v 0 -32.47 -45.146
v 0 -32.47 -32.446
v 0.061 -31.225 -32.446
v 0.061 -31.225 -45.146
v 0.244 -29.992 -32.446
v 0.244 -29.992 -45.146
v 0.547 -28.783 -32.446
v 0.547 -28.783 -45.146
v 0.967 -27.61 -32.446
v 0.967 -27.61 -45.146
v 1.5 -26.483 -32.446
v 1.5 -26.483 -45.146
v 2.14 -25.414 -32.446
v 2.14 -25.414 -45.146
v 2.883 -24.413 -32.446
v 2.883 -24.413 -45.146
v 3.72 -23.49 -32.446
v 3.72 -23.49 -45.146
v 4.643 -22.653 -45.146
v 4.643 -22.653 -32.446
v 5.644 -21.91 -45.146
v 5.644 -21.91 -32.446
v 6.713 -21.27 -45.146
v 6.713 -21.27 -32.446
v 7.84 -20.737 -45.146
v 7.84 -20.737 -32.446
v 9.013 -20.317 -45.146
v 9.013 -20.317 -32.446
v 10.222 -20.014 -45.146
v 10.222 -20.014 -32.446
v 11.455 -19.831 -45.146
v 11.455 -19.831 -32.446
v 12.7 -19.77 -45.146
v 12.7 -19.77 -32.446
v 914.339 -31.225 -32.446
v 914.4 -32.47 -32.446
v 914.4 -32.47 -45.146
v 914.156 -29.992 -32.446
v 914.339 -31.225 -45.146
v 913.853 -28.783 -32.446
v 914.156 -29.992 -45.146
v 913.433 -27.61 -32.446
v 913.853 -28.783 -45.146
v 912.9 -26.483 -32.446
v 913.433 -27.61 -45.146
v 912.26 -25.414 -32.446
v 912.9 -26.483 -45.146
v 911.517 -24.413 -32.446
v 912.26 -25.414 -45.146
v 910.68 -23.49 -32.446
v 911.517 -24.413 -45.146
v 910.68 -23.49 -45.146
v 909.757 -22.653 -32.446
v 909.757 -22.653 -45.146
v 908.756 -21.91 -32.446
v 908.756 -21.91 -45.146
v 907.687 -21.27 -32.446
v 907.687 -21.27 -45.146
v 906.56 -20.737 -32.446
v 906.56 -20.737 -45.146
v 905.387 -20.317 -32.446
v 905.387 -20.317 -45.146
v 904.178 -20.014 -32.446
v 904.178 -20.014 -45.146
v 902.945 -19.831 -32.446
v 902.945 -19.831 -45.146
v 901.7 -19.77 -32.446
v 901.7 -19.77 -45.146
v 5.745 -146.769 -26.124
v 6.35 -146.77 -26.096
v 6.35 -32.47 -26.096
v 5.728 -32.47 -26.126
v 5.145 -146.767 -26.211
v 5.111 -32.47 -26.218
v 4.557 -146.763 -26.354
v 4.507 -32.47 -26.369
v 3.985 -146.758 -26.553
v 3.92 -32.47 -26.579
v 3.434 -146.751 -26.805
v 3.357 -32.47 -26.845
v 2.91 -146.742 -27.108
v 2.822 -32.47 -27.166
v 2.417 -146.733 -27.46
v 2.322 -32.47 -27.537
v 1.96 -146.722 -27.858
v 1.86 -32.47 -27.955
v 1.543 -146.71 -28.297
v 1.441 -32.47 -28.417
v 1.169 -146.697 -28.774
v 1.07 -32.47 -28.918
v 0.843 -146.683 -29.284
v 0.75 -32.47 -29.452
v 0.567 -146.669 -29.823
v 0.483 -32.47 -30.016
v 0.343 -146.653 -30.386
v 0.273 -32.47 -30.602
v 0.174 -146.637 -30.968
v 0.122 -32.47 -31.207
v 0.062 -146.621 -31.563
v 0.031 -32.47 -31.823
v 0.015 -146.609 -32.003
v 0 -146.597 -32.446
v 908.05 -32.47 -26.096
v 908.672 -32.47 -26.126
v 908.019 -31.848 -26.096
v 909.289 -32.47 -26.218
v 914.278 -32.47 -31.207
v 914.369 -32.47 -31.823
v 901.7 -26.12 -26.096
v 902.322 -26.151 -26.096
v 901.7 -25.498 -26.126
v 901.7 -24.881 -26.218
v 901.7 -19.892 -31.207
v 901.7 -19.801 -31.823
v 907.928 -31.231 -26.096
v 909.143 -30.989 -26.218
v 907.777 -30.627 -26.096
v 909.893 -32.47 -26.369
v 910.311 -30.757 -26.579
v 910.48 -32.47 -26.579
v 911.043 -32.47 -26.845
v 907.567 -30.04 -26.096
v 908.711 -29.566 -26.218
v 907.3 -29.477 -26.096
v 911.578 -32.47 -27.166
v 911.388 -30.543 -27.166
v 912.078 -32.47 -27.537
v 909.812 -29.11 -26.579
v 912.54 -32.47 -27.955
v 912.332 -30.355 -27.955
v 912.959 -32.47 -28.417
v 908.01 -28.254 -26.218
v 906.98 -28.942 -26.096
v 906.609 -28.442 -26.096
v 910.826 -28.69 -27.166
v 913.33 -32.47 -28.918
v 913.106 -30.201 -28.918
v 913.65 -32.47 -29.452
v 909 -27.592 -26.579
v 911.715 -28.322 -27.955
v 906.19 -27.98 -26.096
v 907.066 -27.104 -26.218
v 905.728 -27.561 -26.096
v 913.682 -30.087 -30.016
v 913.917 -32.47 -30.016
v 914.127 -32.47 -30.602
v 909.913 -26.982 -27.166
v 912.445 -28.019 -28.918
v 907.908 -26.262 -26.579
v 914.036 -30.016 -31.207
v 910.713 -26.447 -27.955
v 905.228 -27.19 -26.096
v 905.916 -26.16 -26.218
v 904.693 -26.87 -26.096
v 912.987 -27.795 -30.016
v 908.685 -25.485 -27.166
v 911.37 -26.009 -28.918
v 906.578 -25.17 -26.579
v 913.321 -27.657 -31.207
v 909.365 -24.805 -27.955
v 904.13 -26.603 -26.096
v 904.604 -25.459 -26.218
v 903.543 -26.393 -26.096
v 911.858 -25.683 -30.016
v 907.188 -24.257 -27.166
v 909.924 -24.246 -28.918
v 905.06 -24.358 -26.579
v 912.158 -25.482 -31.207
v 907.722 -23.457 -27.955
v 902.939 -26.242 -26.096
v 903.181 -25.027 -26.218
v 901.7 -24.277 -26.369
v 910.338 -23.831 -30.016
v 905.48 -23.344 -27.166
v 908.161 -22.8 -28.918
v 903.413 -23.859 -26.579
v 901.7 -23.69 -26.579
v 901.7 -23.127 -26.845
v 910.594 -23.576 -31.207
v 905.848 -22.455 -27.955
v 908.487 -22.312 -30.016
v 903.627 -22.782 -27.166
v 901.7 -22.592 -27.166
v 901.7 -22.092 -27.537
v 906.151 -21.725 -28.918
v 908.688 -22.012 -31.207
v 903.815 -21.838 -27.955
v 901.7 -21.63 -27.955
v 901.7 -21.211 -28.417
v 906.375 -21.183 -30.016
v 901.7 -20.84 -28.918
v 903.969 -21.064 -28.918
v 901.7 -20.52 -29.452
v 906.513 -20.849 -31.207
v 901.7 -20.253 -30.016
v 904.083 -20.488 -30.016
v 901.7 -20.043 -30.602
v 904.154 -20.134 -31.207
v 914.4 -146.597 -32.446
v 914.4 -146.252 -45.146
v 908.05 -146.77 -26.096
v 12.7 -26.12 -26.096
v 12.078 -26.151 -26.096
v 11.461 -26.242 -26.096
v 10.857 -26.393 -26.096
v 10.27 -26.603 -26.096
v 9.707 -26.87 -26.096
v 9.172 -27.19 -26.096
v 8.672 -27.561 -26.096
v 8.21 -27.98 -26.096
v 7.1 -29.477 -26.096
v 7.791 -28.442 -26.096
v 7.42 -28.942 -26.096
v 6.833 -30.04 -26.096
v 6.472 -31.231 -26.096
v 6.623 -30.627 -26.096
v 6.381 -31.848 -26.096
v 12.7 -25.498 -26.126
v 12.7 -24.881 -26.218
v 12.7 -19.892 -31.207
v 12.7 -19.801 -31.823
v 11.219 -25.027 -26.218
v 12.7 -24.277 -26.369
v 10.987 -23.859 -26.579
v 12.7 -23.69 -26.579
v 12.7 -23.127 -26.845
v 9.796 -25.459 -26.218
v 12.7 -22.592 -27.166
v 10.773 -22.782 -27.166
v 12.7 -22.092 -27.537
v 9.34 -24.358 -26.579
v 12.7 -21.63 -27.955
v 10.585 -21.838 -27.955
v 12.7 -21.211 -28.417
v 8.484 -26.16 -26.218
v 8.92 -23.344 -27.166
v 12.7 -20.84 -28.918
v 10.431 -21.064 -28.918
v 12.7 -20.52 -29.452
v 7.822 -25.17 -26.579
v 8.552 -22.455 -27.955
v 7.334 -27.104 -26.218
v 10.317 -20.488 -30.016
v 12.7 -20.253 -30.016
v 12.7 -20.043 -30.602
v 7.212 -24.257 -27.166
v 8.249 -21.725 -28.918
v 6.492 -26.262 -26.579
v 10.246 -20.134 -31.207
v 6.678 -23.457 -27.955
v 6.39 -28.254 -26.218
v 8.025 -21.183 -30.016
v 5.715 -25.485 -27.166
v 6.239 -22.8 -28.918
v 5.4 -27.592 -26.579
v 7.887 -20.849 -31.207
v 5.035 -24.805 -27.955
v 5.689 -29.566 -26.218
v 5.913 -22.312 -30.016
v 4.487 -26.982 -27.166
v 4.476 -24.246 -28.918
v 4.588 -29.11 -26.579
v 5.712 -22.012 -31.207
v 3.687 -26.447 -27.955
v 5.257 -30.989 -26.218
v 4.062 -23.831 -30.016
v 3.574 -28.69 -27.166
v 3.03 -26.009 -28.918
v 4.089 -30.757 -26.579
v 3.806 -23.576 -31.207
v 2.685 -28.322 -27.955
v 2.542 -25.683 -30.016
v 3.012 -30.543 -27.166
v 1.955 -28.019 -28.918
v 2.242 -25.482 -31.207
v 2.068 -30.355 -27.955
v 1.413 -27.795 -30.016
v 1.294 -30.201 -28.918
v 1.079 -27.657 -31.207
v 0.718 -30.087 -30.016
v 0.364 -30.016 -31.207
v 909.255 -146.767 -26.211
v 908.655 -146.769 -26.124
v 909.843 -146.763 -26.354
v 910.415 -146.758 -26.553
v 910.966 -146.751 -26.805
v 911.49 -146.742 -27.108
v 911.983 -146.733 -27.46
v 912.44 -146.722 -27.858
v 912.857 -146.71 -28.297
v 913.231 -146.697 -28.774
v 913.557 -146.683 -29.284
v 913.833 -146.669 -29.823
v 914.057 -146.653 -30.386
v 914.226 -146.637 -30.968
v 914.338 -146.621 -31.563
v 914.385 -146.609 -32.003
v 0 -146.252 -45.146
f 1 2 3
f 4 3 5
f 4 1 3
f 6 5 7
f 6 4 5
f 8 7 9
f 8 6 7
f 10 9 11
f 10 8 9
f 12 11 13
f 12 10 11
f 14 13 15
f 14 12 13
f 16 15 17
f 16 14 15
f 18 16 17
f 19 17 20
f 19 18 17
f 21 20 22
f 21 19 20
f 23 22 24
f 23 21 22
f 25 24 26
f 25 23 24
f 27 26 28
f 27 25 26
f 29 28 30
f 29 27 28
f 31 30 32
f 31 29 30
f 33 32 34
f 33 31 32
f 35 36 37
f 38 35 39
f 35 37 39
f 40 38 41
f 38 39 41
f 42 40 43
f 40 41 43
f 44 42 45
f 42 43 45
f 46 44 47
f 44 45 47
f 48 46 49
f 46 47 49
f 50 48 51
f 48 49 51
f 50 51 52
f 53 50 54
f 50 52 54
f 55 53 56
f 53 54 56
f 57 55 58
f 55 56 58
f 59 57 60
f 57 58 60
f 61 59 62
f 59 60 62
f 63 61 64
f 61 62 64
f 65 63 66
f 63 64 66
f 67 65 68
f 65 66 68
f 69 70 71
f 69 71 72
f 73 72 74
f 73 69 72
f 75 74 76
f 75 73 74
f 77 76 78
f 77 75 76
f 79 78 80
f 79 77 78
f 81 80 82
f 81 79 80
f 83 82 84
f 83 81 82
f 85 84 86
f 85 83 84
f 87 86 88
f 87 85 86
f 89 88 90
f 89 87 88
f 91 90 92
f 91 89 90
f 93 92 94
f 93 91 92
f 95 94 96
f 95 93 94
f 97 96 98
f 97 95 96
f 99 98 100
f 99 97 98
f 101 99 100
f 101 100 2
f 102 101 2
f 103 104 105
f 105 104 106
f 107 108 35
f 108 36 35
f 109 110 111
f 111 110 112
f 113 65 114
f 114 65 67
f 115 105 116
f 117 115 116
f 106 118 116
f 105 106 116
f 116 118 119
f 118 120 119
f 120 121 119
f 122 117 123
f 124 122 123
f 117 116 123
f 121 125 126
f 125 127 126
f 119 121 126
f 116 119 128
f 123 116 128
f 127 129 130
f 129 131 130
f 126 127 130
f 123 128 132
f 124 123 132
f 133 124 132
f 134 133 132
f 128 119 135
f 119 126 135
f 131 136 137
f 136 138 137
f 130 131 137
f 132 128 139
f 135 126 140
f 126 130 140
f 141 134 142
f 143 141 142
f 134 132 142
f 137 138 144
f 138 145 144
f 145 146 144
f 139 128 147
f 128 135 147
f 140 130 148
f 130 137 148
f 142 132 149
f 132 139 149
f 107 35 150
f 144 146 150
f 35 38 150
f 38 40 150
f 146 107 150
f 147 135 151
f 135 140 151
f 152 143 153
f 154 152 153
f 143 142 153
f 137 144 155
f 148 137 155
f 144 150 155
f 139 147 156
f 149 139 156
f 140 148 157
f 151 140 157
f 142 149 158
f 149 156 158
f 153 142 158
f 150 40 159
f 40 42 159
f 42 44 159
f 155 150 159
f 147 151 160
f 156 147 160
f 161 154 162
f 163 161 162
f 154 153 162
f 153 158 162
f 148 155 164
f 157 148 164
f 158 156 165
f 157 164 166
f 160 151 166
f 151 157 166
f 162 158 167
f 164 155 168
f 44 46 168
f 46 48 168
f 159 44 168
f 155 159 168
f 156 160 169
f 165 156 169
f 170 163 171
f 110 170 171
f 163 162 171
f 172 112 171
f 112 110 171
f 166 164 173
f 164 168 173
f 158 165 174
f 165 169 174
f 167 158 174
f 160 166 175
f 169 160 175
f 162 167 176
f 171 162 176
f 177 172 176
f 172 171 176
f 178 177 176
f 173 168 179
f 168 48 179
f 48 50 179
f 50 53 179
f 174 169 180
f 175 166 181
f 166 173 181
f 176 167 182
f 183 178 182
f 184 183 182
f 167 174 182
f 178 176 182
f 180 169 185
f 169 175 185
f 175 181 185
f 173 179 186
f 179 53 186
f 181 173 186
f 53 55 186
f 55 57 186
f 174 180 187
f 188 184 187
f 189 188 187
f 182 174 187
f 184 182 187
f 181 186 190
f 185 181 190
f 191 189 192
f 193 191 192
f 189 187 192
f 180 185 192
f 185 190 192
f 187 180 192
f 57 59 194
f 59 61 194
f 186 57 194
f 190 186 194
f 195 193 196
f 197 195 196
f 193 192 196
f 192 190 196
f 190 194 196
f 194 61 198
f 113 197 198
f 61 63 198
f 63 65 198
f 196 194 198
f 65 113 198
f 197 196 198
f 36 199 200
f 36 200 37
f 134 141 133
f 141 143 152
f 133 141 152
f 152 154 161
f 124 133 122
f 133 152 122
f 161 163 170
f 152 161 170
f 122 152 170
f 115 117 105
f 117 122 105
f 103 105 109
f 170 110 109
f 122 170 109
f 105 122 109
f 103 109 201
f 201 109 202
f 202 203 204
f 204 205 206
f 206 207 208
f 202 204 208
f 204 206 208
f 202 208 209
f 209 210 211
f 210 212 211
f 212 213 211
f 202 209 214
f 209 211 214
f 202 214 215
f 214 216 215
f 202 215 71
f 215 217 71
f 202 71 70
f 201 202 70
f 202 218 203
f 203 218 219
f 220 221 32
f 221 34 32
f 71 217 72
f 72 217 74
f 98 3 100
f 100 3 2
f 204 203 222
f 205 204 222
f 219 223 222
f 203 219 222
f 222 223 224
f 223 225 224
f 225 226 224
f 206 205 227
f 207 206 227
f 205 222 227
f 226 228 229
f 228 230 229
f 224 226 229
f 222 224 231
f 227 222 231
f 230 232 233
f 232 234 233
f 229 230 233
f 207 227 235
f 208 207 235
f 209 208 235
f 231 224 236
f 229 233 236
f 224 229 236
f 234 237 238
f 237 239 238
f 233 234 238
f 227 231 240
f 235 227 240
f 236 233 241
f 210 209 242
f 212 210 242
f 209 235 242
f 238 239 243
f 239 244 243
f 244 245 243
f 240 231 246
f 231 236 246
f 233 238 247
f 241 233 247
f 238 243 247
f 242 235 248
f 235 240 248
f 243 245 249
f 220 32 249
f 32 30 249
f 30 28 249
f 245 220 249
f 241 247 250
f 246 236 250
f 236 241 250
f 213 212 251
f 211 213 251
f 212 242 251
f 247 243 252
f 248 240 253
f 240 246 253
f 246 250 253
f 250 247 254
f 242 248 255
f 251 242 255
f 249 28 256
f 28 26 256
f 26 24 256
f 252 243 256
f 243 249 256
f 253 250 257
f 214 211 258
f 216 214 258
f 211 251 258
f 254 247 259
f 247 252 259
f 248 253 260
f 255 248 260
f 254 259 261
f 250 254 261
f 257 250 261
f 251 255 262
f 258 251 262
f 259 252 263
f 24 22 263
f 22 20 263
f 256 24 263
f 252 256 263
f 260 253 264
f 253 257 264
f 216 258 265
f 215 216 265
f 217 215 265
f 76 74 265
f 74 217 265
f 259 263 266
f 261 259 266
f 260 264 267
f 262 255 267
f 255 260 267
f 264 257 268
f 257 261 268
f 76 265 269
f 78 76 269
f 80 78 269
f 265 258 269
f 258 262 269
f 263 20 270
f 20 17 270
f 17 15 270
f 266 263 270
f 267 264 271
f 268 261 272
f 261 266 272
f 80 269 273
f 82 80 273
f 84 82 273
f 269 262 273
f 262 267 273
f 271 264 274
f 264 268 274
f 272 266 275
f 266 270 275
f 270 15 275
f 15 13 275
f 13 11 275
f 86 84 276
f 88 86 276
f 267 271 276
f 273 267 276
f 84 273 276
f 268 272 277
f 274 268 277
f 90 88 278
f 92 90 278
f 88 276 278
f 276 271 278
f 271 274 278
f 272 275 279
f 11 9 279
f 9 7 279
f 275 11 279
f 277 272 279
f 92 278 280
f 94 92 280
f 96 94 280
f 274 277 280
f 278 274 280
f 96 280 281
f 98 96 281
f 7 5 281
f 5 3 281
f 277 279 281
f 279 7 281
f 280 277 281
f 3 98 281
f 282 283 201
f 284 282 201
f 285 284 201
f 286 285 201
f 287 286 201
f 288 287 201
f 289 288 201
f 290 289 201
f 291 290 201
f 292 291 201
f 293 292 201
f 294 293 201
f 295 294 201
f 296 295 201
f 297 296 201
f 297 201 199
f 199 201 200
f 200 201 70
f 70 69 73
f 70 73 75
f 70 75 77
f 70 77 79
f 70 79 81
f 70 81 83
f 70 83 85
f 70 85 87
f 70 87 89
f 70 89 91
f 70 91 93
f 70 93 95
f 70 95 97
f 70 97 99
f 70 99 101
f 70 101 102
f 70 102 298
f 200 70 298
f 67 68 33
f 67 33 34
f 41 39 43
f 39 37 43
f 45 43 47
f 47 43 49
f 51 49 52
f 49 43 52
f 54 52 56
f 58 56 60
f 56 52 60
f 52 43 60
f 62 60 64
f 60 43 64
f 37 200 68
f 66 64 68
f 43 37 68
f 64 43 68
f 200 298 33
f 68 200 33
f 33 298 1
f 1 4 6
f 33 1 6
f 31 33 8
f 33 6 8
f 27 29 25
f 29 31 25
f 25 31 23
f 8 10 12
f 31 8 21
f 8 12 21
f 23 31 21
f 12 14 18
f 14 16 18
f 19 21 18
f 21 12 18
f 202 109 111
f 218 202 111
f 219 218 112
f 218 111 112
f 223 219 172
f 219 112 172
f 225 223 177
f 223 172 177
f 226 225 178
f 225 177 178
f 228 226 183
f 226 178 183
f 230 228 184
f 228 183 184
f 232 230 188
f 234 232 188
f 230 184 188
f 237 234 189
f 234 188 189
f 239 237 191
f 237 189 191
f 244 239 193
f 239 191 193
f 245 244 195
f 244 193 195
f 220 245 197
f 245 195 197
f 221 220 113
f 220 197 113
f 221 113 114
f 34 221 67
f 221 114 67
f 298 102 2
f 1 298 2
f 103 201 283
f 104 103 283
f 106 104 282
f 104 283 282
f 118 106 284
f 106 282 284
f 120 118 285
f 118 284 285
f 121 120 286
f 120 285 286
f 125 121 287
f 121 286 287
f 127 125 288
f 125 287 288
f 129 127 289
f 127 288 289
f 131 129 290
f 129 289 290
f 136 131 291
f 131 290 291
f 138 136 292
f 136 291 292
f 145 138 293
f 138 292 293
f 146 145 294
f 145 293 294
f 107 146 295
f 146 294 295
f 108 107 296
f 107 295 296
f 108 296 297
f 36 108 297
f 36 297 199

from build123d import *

# Parameters (mm, degrees)
F1_DEPTH    = 914.4
F2_R        = 6.35
F3_T1_DEPTH = 50.8
F3_T4_ANGLE = 90
F3_T6_ANGLE = 90


# Not quite as in the source:
# - a fillet or chamfer that OpenCascade refuses, or shapes differently, is made with other operations: its cross-section is extruded or revolved along the edge and cut away or added


with BuildPart() as f1:
    # F0 (on Right) → F1 (new body)
    with BuildSketch(Plane.YZ):
        Polygon((-19.769934752, -26.0955506578), (-146.769934752, -26.0955506578), (-146.2517950619, -45.1455506578), (-19.769934752, -45.1455506578), align=None)
    extrude(amount=F1_DEPTH)

    # F2
    f2_edges = [f1.edges().sort_by_distance(p)[0] for p in [
        (0, -83.269935, -26.095551),
        (457.2, -19.769935, -26.095551),
        (914.4, -83.269935, -26.095551),
    ]]
    fillet(f2_edges, radius=F2_R)

    # F3: fillet of radius 12.7 on 2 edges, made by hand

    # F3_s2 → F3_t1 (cut)
    with BuildSketch(Plane.XY.offset(-76.8955506578)):
        with BuildLine():
            ThreePointArc((914.4, -32.469934752), (910.6802561211, -23.489678631), (901.7, -19.769934752))
            Line((901.7, -19.769934752), (914.4, -19.769934752))
            Line((914.4, -19.769934752), (914.4, -32.469934752))
        make_face()
        with BuildLine():
            ThreePointArc((0, -32.469934752), (3.7197438789, -23.489678631), (12.7, -19.769934752))
            Line((12.7, -19.769934752), (0, -19.769934752))
            Line((0, -19.769934752), (0, -32.469934752))
        make_face()
    extrude(amount=F3_T1_DEPTH, mode=Mode.SUBTRACT)

    # F3_s3 → F3_t4 (revolve, cut)
    with BuildSketch(Plane.YZ.offset(12.7)):
        with BuildLine():
            ThreePointArc((-26.119934752, -26.0955506578), (-21.6298066915, -27.9554225973), (-19.769934752, -32.4455506578))
            Line((-19.769934752, -32.4455506578), (-19.769934752, -26.0955506578))
            Line((-19.769934752, -26.0955506578), (-26.119934752, -26.0955506578))
        make_face()
    revolve(axis=Axis((12.7, -32.469934752, -26.0955506578), (0, 0, 1)), revolution_arc=F3_T4_ANGLE, mode=Mode.SUBTRACT)

    # F3_s5 → F3_t6 (revolve, cut)
    with BuildSketch(Plane.XZ.offset(32.469934752)):
        with BuildLine():
            ThreePointArc((908.05, -26.0955506578), (912.5401280605, -27.9554225973), (914.4, -32.4455506578))
            Line((914.4, -32.4455506578), (914.4, -26.0955506578))
            Line((914.4, -26.0955506578), (908.05, -26.0955506578))
        make_face()
    revolve(axis=Axis((901.7, -32.469934752, -26.0955506578), (0, 0, 1)), revolution_arc=F3_T6_ANGLE, mode=Mode.SUBTRACT)


solid = f1.part
